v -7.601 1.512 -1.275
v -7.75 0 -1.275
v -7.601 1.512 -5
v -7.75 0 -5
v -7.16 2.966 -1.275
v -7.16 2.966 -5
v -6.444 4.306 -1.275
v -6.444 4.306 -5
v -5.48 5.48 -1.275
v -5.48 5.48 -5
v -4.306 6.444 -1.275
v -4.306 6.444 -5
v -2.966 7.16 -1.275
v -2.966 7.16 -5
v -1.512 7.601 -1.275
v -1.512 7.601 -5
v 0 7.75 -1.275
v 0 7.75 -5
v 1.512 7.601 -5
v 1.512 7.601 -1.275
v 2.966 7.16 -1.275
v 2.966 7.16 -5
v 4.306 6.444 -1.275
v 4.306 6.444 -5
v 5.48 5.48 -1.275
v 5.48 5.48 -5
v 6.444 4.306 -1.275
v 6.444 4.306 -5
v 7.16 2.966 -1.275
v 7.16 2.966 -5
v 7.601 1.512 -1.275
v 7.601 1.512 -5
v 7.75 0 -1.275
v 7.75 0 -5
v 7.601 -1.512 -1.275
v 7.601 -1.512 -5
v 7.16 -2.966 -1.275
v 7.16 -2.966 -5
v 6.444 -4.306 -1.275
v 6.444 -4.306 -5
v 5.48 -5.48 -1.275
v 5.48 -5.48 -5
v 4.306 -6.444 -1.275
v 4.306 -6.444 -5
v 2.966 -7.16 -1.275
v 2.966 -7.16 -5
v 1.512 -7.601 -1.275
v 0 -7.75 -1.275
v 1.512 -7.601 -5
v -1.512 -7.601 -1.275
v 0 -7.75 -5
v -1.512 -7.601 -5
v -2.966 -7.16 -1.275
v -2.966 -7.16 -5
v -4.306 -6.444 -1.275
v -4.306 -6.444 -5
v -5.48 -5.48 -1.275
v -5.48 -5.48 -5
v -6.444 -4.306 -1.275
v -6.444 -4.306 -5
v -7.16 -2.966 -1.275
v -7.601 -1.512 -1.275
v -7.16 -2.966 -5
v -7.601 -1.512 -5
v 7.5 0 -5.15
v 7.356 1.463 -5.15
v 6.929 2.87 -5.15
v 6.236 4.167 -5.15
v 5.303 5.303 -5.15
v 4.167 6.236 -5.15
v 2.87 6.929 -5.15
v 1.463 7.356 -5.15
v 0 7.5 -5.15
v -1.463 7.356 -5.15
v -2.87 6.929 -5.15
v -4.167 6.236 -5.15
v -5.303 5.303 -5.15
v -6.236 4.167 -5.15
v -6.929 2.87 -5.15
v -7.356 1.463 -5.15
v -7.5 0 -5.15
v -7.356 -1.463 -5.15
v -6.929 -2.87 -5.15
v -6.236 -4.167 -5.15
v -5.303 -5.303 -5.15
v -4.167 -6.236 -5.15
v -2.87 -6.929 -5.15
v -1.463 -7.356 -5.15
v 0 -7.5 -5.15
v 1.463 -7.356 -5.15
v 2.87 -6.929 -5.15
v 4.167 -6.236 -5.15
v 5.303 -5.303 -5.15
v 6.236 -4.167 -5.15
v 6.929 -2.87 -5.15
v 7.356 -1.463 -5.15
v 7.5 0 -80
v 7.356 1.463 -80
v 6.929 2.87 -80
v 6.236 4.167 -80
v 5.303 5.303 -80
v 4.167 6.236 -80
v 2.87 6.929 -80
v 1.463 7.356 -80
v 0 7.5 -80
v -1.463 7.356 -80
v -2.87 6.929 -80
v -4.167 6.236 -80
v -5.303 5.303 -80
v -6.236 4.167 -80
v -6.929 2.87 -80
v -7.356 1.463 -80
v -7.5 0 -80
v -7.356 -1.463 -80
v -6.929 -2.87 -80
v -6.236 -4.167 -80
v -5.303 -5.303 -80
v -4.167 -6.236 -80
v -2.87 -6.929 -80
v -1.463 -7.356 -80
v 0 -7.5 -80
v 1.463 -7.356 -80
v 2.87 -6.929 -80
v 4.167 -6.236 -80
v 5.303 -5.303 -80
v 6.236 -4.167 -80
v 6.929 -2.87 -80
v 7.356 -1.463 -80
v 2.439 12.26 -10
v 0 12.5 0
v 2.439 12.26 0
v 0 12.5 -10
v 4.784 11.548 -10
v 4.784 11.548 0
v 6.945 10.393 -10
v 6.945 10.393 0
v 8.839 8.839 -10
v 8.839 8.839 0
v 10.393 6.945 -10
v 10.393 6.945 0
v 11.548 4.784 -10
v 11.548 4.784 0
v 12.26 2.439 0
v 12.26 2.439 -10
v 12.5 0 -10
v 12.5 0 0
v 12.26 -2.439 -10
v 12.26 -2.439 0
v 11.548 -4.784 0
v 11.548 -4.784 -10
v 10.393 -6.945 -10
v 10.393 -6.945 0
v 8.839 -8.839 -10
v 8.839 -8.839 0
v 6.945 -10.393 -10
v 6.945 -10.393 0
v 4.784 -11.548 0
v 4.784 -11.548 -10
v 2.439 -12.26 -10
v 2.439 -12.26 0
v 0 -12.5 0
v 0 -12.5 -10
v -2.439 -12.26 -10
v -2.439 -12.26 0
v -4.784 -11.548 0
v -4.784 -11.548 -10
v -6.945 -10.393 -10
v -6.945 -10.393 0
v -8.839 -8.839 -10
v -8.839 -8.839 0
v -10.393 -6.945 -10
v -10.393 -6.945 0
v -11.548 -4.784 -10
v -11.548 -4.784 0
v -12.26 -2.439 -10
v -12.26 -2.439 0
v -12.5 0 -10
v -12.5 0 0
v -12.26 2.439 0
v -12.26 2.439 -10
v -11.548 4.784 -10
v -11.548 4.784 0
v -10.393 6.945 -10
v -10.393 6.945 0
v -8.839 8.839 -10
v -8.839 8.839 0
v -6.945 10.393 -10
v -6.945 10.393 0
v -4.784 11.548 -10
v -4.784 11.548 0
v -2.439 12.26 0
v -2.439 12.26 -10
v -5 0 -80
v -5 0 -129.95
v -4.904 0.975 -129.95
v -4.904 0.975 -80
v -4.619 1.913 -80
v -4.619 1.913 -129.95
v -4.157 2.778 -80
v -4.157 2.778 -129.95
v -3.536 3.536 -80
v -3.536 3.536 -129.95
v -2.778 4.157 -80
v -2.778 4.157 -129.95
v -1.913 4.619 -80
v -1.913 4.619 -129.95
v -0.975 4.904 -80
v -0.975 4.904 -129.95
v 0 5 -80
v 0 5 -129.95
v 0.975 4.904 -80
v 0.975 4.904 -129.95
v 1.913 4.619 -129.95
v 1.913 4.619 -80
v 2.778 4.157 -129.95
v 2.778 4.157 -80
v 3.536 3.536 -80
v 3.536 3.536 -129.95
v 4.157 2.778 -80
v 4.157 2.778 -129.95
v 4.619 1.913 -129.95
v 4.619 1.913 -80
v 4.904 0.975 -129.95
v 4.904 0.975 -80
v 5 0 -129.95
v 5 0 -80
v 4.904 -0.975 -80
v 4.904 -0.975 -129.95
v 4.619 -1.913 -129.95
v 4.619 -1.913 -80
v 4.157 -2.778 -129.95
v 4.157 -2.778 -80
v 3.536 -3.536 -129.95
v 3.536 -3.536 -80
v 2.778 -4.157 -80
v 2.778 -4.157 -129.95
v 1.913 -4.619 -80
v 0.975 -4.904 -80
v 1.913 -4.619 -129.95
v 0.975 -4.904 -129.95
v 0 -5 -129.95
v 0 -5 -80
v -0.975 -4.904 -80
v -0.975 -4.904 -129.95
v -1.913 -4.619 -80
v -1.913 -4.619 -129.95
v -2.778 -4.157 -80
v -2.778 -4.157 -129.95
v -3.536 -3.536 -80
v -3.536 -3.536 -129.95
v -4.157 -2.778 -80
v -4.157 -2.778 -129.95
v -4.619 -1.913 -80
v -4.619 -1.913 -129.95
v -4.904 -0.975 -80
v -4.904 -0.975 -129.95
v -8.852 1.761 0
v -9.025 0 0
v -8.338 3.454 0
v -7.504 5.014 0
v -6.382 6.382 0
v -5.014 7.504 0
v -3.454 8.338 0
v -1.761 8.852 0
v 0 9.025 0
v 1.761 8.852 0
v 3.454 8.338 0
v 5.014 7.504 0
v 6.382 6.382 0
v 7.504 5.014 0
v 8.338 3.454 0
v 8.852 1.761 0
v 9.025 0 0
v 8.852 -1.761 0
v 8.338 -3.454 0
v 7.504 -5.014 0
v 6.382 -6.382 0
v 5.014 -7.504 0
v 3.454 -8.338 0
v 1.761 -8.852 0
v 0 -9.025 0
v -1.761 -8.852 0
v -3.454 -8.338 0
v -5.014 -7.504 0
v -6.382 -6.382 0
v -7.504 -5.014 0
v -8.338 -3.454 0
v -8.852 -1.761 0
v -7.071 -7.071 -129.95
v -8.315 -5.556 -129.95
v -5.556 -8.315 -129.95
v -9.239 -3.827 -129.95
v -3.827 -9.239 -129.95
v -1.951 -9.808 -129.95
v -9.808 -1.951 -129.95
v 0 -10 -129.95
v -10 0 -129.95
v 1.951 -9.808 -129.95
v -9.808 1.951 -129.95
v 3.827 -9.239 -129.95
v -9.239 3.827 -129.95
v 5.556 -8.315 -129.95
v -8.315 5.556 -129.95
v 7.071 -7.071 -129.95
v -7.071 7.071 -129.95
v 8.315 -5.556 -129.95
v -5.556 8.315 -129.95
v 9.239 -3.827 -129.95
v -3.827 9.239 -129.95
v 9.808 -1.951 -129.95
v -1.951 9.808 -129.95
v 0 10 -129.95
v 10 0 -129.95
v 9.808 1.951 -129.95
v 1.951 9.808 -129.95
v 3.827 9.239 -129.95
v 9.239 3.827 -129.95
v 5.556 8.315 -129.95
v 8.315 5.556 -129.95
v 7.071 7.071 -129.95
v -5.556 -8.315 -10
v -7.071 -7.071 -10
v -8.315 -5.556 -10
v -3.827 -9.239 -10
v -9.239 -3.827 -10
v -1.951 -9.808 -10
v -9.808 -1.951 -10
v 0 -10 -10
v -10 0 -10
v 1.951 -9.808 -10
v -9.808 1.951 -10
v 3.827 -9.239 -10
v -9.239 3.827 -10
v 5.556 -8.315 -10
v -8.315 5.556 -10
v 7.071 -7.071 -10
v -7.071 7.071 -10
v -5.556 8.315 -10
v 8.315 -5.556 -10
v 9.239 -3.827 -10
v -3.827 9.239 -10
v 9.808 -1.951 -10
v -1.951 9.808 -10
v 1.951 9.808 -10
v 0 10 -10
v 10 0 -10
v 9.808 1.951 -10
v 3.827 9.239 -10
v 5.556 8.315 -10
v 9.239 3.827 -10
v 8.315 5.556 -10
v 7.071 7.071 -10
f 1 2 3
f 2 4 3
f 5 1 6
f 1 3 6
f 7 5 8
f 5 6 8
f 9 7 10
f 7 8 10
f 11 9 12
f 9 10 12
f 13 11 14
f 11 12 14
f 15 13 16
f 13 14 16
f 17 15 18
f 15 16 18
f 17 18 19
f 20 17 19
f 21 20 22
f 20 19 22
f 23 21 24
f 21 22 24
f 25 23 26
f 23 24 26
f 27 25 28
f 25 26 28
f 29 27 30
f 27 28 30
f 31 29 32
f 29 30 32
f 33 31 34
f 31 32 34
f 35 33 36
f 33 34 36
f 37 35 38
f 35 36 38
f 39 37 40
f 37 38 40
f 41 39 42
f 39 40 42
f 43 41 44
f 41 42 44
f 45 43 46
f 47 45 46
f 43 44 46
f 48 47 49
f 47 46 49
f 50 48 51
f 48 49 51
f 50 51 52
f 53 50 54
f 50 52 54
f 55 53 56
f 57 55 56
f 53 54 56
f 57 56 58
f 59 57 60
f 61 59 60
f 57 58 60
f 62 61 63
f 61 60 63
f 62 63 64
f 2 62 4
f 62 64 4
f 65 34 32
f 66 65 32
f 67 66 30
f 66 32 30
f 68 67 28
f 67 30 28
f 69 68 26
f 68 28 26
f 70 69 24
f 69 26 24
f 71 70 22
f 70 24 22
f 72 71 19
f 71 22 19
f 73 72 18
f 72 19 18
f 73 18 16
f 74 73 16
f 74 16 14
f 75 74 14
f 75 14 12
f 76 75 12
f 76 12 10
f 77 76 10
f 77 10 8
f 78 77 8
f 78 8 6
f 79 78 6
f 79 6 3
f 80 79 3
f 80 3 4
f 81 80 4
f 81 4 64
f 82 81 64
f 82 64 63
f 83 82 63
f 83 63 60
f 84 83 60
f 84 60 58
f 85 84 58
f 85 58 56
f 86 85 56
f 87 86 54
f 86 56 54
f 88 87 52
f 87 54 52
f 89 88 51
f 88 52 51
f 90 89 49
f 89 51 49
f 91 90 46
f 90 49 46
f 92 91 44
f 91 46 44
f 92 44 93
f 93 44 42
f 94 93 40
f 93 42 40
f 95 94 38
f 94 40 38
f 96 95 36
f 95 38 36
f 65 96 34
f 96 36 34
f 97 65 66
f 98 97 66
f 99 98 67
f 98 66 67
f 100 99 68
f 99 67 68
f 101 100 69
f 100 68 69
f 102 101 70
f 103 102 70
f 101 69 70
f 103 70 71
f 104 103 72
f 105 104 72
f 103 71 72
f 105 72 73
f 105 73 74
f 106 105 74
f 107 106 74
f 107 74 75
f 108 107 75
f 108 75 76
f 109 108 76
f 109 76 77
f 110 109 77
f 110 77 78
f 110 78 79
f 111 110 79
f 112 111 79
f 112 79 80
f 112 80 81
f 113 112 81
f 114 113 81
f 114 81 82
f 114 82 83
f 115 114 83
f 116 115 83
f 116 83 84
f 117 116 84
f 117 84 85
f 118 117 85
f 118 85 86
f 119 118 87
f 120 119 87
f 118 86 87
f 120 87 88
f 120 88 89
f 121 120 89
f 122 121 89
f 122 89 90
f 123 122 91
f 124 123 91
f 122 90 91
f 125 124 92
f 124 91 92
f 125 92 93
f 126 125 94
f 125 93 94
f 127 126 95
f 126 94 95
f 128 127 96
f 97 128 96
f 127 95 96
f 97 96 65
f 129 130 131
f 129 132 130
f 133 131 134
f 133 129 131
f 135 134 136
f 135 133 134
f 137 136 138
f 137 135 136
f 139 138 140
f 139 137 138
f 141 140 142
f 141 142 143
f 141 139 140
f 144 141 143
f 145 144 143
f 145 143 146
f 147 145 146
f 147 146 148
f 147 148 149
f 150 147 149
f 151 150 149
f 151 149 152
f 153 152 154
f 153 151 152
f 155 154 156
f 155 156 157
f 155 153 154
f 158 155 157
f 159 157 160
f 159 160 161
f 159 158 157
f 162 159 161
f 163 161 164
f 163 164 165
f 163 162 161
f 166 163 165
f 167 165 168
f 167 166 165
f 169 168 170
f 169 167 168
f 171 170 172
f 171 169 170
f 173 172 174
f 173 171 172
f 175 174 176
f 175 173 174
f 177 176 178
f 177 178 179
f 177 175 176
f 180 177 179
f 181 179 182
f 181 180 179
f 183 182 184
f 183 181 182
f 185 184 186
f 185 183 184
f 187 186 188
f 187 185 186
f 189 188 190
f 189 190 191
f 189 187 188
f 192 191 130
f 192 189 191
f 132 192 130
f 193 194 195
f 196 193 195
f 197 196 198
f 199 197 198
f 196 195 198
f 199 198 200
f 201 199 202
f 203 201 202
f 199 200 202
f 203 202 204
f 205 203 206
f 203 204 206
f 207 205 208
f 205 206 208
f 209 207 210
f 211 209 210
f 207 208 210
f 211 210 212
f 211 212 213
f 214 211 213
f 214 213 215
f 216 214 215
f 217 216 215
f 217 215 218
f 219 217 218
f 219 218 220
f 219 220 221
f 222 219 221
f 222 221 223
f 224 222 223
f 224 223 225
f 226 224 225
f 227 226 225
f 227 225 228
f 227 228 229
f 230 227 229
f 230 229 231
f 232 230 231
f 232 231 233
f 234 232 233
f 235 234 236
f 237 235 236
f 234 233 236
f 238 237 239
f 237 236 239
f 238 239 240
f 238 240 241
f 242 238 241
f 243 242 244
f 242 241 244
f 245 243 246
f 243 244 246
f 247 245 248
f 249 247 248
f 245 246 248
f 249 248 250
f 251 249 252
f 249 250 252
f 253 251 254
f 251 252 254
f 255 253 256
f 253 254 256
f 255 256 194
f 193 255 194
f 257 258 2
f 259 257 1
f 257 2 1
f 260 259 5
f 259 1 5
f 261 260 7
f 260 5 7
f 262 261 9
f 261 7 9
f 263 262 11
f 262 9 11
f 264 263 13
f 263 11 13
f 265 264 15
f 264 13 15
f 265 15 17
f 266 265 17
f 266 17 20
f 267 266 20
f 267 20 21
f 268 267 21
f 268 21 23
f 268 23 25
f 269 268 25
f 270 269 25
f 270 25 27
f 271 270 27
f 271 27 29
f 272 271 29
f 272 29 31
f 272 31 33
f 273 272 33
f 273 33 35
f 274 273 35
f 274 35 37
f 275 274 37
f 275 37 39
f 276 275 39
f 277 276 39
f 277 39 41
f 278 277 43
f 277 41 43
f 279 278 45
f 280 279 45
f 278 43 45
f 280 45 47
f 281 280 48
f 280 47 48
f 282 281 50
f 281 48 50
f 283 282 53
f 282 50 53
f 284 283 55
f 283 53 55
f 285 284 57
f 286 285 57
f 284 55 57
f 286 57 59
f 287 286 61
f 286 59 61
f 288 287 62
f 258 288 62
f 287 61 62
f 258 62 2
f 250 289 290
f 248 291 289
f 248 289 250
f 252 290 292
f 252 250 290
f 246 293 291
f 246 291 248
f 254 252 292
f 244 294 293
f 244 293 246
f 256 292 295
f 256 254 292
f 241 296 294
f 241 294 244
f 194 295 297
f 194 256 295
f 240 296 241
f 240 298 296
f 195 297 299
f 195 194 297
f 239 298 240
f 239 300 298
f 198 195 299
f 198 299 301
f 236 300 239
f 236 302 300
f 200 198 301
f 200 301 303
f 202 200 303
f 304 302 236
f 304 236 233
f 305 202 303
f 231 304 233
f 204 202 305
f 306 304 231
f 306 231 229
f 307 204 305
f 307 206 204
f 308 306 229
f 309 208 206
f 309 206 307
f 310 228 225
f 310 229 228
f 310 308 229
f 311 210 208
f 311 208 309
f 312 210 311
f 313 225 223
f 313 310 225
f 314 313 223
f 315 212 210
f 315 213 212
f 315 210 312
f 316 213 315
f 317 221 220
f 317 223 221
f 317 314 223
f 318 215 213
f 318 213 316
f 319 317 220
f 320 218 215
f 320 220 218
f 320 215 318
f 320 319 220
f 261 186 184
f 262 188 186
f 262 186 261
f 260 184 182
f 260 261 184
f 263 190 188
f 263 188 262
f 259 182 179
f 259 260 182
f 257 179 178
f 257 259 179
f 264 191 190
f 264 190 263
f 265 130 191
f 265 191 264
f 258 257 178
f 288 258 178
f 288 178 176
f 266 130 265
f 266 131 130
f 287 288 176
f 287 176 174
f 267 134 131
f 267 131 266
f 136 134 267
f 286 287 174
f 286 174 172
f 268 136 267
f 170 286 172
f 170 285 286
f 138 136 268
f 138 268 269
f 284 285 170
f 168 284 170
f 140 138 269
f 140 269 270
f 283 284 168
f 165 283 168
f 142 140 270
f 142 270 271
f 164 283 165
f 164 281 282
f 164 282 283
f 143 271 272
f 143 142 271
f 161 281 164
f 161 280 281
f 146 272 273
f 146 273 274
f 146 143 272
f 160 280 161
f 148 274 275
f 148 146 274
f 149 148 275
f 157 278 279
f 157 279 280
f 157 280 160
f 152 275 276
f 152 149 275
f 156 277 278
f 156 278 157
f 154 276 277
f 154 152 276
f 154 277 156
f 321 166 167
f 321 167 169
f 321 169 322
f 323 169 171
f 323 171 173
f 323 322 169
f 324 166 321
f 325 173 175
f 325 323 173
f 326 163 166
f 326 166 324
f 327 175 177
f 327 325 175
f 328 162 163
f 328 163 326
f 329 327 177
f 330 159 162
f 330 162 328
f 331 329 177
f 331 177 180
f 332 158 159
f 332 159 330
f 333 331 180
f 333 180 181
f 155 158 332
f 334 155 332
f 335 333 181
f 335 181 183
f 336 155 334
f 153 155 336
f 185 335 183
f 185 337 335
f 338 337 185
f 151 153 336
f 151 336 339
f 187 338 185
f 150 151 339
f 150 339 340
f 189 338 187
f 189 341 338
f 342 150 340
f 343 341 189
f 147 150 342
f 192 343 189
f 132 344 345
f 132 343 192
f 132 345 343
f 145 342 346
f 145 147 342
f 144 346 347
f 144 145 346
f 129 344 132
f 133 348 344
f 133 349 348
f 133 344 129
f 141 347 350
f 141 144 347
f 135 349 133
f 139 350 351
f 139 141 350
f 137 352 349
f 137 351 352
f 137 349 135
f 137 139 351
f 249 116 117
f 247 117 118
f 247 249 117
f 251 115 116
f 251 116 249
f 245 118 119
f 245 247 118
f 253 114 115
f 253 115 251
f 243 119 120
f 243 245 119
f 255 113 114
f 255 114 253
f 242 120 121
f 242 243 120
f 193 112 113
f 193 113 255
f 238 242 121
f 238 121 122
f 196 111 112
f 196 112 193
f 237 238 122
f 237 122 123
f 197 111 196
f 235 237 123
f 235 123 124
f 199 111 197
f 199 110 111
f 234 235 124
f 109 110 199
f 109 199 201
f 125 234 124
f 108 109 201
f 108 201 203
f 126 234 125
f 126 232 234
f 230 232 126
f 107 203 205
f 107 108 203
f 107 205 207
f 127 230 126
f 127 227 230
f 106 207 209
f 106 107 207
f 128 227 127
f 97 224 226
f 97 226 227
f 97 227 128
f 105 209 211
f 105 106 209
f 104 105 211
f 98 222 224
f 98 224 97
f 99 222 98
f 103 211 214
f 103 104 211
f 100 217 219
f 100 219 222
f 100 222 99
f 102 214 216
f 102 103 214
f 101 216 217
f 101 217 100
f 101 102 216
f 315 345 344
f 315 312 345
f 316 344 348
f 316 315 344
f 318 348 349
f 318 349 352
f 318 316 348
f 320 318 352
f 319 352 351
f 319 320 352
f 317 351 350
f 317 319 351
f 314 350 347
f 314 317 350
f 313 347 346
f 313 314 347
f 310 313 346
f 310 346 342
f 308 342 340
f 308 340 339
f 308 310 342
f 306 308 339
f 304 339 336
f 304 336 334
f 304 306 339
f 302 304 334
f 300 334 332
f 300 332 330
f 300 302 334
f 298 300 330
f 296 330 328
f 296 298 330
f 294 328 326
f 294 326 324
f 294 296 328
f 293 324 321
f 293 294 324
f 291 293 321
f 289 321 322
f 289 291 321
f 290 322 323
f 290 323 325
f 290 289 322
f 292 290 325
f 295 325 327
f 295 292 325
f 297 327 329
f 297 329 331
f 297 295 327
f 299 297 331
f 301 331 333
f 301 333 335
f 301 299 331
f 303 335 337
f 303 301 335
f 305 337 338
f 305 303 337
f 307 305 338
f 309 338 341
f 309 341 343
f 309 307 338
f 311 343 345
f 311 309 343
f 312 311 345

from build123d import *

# Parameters (mm, degrees)
SKETCH4_R                    = 5
CUT_EXTRUDE1_DEPTH           = 119.95
SKETCH5_R                    = 7.5
CUT_EXTRUDE2_DEPTH           = 80
M18_TAPPED_HOLE1_D           = 15.5
M18_TAPPED_HOLE1_DEPTH       = 5
M18_TAPPED_HOLE1_CSINK_D     = 18.05
M18_TAPPED_HOLE1_CSINK_ANGLE = 90
M18_TAPPED_HOLE1_TIP         = 4.656669797


with BuildPart() as part:
    # Sketch3 → Revolve2 (revolve)
    with BuildSketch(Plane(origin=(0, 0, 0), x_dir=(0, 0, -1), z_dir=(1, 0, 0))):
        Polygon((0, 12.5), (10, 12.5), (10, 10), (129.95, 10), (129.95, 0), (0, 0), align=None)
    revolve(axis=Axis((0, 0, 0), (0, 0, -1)))

    # Sketch4 → Cut-Extrude1 (cut)
    with BuildSketch(Plane(origin=(0, 0, -129.95), x_dir=(-1, 0, 0), z_dir=(0, 0, -1))):
        Circle(SKETCH4_R)
    extrude(amount=-CUT_EXTRUDE1_DEPTH, mode=Mode.SUBTRACT)

    # Sketch5 → Cut-Extrude2 (cut)
    with BuildSketch(Plane.XY):
        Circle(SKETCH5_R)
    extrude(amount=-CUT_EXTRUDE2_DEPTH, mode=Mode.SUBTRACT)

    # M18 Tapped Hole1
    with Locations(Plane.XY):
        with Locations((0, 0)):
            CounterSinkHole(M18_TAPPED_HOLE1_D / 2, M18_TAPPED_HOLE1_CSINK_D / 2, depth=M18_TAPPED_HOLE1_DEPTH, counter_sink_angle=M18_TAPPED_HOLE1_CSINK_ANGLE)
            with Locations((0, 0, -(M18_TAPPED_HOLE1_DEPTH + M18_TAPPED_HOLE1_TIP / 2))):  # 118° drill point
                Cone(0, M18_TAPPED_HOLE1_D / 2, M18_TAPPED_HOLE1_TIP, mode=Mode.SUBTRACT)


solid = part.part
